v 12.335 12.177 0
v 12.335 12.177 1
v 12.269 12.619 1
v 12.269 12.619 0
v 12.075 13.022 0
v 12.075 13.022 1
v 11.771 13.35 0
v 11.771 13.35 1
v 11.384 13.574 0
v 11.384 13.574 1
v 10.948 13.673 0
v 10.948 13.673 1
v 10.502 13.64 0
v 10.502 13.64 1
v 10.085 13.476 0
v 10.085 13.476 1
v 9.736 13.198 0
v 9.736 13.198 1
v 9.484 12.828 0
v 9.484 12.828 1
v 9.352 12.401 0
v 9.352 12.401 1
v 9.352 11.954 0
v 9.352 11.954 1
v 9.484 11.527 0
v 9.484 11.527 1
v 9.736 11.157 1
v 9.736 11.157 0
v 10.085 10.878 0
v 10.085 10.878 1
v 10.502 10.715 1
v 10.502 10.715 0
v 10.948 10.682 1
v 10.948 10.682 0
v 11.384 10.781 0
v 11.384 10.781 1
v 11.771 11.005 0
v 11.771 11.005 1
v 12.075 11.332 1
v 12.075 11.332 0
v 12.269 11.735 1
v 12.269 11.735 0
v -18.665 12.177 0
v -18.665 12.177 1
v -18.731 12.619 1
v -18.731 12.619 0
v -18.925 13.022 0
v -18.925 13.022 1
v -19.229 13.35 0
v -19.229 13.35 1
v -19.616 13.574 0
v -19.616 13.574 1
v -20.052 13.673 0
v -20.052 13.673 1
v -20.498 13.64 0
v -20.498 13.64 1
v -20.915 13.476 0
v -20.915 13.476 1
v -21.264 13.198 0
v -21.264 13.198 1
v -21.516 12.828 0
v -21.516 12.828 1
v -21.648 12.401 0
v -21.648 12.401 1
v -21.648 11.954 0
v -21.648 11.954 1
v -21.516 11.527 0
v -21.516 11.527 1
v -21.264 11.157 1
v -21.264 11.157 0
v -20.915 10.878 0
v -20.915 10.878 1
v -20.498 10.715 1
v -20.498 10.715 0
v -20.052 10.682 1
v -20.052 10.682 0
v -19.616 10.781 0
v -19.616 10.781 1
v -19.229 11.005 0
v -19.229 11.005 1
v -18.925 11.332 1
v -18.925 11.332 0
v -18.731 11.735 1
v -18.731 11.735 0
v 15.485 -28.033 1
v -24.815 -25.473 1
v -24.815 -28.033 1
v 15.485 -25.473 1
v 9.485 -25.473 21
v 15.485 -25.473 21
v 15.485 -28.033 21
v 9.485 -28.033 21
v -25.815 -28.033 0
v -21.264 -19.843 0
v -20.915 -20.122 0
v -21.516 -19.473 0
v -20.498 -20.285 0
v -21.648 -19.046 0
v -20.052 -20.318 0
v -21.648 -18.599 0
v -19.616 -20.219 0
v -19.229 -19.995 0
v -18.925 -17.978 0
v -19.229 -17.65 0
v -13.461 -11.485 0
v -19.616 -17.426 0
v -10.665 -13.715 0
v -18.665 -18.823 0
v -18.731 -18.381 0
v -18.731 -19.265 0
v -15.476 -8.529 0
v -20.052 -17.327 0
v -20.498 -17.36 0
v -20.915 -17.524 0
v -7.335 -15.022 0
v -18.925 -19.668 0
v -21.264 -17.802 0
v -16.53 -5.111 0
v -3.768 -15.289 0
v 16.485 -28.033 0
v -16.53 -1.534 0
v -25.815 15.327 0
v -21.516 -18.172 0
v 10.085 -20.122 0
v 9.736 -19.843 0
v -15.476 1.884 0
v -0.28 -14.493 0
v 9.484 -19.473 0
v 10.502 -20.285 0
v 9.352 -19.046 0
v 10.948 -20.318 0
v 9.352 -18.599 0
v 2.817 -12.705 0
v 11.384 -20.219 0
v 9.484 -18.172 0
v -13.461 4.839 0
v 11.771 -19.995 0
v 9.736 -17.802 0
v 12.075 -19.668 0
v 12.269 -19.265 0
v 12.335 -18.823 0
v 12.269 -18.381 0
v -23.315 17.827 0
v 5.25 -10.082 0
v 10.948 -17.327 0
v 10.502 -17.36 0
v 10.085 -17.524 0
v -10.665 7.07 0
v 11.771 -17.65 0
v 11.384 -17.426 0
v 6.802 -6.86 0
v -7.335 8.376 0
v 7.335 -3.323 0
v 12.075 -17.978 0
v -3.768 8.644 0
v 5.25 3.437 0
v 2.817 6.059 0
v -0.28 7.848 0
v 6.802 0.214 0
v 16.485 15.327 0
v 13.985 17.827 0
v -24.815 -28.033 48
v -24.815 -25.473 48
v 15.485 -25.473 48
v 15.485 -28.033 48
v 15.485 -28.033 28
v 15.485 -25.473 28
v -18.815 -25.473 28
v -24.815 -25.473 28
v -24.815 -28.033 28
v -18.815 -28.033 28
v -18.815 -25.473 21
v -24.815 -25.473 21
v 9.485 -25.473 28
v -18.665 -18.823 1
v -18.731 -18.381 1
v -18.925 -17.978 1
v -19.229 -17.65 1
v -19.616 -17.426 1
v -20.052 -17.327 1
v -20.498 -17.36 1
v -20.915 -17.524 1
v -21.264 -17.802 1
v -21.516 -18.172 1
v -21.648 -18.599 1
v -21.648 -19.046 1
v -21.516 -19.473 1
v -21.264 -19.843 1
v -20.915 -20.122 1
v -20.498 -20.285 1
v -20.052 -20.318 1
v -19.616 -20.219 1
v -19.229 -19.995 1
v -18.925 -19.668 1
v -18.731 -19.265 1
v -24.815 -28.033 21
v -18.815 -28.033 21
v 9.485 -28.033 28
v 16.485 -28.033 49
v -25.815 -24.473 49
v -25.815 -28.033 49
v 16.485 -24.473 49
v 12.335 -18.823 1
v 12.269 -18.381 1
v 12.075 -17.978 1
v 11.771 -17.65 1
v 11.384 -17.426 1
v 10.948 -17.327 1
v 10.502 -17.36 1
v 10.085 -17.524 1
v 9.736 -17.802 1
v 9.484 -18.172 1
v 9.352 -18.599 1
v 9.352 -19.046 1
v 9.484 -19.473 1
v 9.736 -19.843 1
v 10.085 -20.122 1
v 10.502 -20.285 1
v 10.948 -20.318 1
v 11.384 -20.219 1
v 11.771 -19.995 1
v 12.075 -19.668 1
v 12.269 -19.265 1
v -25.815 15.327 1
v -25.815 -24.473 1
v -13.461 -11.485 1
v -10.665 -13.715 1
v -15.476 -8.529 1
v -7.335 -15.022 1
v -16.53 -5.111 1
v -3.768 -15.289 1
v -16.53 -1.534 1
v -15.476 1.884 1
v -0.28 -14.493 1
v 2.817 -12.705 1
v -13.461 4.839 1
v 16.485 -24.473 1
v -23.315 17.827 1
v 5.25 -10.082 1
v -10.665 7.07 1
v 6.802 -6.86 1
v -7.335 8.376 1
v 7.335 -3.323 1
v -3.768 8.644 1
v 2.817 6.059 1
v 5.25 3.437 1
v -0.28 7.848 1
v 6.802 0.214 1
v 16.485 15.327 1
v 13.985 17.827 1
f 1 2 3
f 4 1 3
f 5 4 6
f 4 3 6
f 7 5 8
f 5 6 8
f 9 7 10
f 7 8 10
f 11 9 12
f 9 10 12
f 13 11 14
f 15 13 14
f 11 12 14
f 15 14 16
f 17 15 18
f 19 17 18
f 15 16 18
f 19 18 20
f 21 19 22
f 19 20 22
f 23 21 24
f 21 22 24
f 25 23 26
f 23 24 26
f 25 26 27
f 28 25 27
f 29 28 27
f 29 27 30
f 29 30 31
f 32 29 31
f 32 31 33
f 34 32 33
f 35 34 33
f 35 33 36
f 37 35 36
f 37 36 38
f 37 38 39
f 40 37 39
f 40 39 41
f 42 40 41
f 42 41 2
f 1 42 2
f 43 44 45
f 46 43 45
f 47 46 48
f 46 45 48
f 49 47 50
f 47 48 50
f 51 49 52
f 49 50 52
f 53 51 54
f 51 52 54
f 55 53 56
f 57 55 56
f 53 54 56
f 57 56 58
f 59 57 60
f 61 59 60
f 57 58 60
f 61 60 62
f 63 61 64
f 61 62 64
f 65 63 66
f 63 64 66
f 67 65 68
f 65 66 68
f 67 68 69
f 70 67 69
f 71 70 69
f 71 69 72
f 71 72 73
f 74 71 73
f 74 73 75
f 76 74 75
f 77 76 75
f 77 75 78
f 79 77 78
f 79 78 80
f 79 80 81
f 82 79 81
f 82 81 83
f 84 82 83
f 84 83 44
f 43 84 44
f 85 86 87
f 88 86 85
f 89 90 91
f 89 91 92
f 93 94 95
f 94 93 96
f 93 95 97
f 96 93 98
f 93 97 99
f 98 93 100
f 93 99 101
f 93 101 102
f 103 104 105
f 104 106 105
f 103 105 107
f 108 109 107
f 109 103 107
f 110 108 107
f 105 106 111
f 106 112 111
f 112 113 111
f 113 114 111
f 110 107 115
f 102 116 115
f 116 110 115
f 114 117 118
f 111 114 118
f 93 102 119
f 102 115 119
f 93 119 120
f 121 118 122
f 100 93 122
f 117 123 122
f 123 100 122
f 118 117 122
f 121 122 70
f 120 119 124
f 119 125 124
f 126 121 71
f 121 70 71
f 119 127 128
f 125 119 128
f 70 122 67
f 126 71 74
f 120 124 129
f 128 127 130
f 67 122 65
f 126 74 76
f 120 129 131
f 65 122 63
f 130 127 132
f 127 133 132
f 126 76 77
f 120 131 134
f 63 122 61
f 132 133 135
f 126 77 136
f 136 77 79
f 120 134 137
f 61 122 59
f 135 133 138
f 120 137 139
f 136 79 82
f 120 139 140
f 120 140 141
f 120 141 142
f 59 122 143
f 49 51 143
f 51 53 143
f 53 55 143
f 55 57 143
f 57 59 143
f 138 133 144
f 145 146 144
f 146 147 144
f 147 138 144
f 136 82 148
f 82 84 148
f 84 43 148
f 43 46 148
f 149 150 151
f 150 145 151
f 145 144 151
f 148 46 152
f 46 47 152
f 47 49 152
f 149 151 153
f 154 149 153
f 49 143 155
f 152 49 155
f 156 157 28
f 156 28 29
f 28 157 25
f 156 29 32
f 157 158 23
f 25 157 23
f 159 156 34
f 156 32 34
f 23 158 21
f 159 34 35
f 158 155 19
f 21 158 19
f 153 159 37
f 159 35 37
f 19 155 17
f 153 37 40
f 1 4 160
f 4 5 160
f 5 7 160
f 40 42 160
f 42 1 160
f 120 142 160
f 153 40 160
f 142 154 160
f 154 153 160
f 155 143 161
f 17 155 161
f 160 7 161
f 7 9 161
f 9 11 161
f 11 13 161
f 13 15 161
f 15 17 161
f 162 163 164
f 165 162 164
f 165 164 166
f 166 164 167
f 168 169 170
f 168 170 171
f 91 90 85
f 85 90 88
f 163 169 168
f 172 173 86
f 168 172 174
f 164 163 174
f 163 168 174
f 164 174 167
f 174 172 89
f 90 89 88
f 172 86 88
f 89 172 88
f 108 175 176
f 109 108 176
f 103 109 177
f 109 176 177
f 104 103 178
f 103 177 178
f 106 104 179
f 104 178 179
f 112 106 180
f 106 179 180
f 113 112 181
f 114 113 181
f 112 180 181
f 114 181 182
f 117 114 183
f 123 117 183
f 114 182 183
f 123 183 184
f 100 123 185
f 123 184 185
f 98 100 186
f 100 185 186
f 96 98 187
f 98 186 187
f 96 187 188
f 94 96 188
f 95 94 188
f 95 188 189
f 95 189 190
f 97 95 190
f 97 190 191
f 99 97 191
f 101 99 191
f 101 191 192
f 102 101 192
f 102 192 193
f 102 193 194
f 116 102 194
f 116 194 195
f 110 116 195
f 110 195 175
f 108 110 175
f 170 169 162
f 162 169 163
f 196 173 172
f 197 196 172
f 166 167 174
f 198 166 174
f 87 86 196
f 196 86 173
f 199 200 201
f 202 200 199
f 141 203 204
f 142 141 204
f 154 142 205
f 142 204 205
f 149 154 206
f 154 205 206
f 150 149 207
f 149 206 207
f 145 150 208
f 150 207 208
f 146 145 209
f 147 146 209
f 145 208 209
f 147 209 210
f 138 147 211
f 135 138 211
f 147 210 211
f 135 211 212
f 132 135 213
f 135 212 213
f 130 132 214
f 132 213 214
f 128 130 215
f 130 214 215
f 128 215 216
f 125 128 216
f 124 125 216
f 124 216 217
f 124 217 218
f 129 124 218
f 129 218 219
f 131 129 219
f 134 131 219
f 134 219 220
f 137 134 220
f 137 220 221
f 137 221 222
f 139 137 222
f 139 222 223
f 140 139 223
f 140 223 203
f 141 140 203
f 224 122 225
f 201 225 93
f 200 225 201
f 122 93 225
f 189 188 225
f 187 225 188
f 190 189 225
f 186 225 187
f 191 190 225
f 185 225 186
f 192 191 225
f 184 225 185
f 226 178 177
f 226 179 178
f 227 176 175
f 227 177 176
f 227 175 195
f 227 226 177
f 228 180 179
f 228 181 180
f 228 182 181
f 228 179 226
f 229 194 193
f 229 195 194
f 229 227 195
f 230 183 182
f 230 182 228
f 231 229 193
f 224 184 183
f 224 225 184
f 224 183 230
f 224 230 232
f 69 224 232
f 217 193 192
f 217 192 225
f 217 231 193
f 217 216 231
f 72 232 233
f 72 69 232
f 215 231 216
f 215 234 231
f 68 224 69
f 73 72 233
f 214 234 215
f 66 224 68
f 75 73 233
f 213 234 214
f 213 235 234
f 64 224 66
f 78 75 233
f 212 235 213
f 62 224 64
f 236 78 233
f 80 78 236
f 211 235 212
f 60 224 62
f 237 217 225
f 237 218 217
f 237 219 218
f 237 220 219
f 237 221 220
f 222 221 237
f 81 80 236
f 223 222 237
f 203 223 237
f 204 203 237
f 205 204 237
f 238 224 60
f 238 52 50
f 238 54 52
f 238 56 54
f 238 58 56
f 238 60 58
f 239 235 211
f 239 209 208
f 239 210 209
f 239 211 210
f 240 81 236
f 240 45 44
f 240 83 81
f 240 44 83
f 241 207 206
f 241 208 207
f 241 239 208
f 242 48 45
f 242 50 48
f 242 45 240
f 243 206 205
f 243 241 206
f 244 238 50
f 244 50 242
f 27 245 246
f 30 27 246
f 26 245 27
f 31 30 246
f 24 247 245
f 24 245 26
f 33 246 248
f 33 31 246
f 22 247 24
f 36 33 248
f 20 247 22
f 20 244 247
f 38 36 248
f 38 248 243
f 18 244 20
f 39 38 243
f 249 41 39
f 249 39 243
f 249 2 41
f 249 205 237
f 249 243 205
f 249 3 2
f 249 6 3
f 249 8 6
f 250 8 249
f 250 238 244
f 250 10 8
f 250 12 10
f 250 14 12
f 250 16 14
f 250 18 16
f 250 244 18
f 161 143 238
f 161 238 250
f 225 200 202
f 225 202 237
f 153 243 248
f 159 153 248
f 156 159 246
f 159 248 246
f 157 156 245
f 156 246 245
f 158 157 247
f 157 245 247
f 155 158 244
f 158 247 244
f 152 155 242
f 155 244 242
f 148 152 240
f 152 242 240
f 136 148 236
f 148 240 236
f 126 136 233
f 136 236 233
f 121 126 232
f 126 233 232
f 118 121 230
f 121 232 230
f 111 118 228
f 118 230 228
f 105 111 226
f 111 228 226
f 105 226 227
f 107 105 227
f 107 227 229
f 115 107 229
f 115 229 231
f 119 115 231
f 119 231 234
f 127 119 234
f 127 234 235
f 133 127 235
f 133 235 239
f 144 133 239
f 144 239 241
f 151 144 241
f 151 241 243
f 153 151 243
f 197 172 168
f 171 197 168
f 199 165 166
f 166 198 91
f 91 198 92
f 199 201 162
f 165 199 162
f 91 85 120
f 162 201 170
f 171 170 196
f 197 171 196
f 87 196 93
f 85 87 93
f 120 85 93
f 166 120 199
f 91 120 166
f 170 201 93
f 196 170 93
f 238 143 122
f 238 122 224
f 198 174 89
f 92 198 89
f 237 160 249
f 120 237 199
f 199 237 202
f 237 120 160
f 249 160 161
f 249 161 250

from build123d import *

# Parameters (mm, degrees)
SKETCH1_W            = 42.3
SKETCH1_H            = 42.3
BOSS_EXTRUDE1_DEPTH  = 1
SKETCH3_R            = 0.5
CUT_EXTRUDE1_DEPTH   = 2
CHAMFER1_SIZE        = 2.5
SKETCH4_R            = 12
CUT_EXTRUDE2_DEPTH   = 2
SKETCH5_R            = 1.5
CUT_EXTRUDE3_DEPTH   = 2
SKETCH6_W            = 42.3
SKETCH6_H            = 1
BOSS_EXTRUDE2_DEPTH  = 3.21
SKETCH7_W            = 42.3
SKETCH7_H            = 5.71
BOSS_EXTRUDE3_DEPTH  = 1
SKETCH8_W            = 42.3
SKETCH8_H            = 1
BOSS_EXTRUDE4_DEPTH  = 0.35
SKETCH9_W            = 42.3
SKETCH9_H            = 1
BOSS_EXTRUDE5_DEPTH  = 48
SKETCH10_W           = 42.3
SKETCH10_H           = 1
BOSS_EXTRUDE6_DEPTH  = 2.56
SKETCH11_W           = 49
SKETCH11_H           = 3.56
BOSS_EXTRUDE7_DEPTH  = 1
SKETCH12_W           = 5
SKETCH12_H           = 1
BOSS_EXTRUDE8_DEPTH  = 5
SKETCH13_W           = 49
SKETCH13_H           = 3.56
BOSS_EXTRUDE9_DEPTH  = 1
SKETCH14_W           = 5
SKETCH14_H           = 5
BOSS_EXTRUDE10_DEPTH = 3.56
SKETCH15_W           = 5
SKETCH15_H           = 2.56
CUT_EXTRUDE4_DEPTH   = 5
SKETCH16_R           = 1
CUT_EXTRUDE5_DEPTH   = 5
SKETCH17_W           = 5
SKETCH17_H           = 5
SKETCH17_R           = 1
BOSS_EXTRUDE11_DEPTH = 2.56
CUT_EXTRUDE6_DEPTH   = 5
SKETCH20_W           = 5
SKETCH20_H           = 3.56
BOSS_EXTRUDE12_DEPTH = 1
SKETCH21_W           = 6
SKETCH21_H           = 3.56
BOSS_EXTRUDE13_DEPTH = 1
SKETCH22_W           = 6
SKETCH22_H           = 3.56
BOSS_EXTRUDE14_DEPTH = 1
SKETCH23_W           = 5
SKETCH23_H           = 5
BOSS_EXTRUDE15_DEPTH = 2.56
SKETCH24_W           = 5
SKETCH24_H           = 3.56
BOSS_EXTRUDE16_DEPTH = 1
SKETCH25_W           = 5
SKETCH25_H           = 3.56
BOSS_EXTRUDE17_DEPTH = 1
SKETCH26_W           = 7
SKETCH26_H           = 3.56
BOSS_EXTRUDE18_DEPTH = 1
CUT_EXTRUDE7_DEPTH   = 21
SKETCH31_W           = 6
SKETCH31_H           = 7
CUT_EXTRUDE8_DEPTH   = 4.56
SKETCH32_W           = 6
SKETCH32_H           = 7
BOSS_EXTRUDE19_DEPTH = 2.56
BOSS_EXTRUDE20_START = -2.56
SKETCH34_W           = 6
SKETCH34_H           = 7
BOSS_EXTRUDE20_DEPTH = 2.56
SKETCH35_W           = 6
SKETCH35_H           = 7
CUT_EXTRUDE9_DEPTH   = 46.86


with BuildPart() as part:
    # Sketch1 → Boss-Extrude1 (new body)
    with BuildSketch(Plane.XY):
        with Locations((-4.664501511, -3.32265861)):
            Rectangle(SKETCH1_W, SKETCH1_H)
    extrude(amount=BOSS_EXTRUDE1_DEPTH)

    # Sketch3 → Cut-Extrude1 (cut, through all)
    with BuildSketch(Plane.XY.offset(1)):
        with Locations((-20.164501511, -18.82265861)):
            Circle(SKETCH3_R)
        with Locations((10.835498489, -18.82265861)):
            Circle(SKETCH3_R)
        with Locations((10.835498489, 12.17734139)):
            Circle(SKETCH3_R)
        with Locations((-20.164501511, 12.17734139)):
            Circle(SKETCH3_R)
    extrude(amount=-CUT_EXTRUDE1_DEPTH, mode=Mode.SUBTRACT)

    # Chamfer1
    chamfer1_edges = [part.edges().sort_by_distance(p)[0] for p in [
        (-25.814501511, 17.82734139, 0.5),
        (16.485498489, 17.82734139, 0.5),
        (16.485498489, -24.47265861, 0.5),
        (-25.814501511, -24.47265861, 0.5),
    ]]
    chamfer(chamfer1_edges, length=CHAMFER1_SIZE)

    # Sketch4 → Cut-Extrude2 (cut, through all)
    with BuildSketch(Plane.XY.offset(1)):
        with Locations((-4.664501511, -3.32265861)):
            Circle(SKETCH4_R)
    extrude(amount=-CUT_EXTRUDE2_DEPTH, mode=Mode.SUBTRACT)

    # Sketch5 → Cut-Extrude3 (cut, through all)
    with BuildSketch(Plane.XY.offset(1)):
        with Locations((-20.164501511, 12.17734139)):
            Circle(SKETCH5_R)
        with Locations((-20.164501511, -18.82265861)):
            Circle(SKETCH5_R)
        with Locations((10.835498489, -18.82265861)):
            Circle(SKETCH5_R)
        with Locations((10.835498489, 12.17734139)):
            Circle(SKETCH5_R)
    extrude(amount=-CUT_EXTRUDE3_DEPTH, mode=Mode.SUBTRACT)

    # Sketch6 → Boss-Extrude2 (add)
    with BuildSketch(Plane.XZ.offset(24.47265861)):
        with Locations((-4.664501511, 0.5)):
            Rectangle(SKETCH6_W, SKETCH6_H)
    extrude(amount=BOSS_EXTRUDE2_DEPTH)

    # Sketch7 → Boss-Extrude3 (add)
    with BuildSketch(Plane.XY.offset(1)):
        with Locations((-4.664501511, -24.82765861)):
            Rectangle(SKETCH7_W, SKETCH7_H)
    extrude(amount=-BOSS_EXTRUDE3_DEPTH)

    # Sketch8 → Boss-Extrude4 (add)
    with BuildSketch(Plane.XZ.offset(27.68265861)):
        with Locations((-4.664501511, 0.5)):
            Rectangle(SKETCH8_W, SKETCH8_H)
    extrude(amount=BOSS_EXTRUDE4_DEPTH)

    # Sketch9 → Boss-Extrude5 (add)
    with BuildSketch(Plane.XY.offset(1)):
        with Locations((-4.664501511, -24.97265861)):
            Rectangle(SKETCH9_W, SKETCH9_H)
    extrude(amount=BOSS_EXTRUDE5_DEPTH)

    # Sketch10 → Boss-Extrude6 (add)
    with BuildSketch(Plane.XZ.offset(25.47265861)):
        with Locations((-4.664501511, 48.5)):
            Rectangle(SKETCH10_W, SKETCH10_H)
    extrude(amount=BOSS_EXTRUDE6_DEPTH)

    # Sketch11 → Boss-Extrude7 (add)
    with BuildSketch(Plane.ZY.offset(25.814501511)):
        with Locations((24.5, -26.25265861)):
            Rectangle(SKETCH11_W, SKETCH11_H)
    extrude(amount=-BOSS_EXTRUDE7_DEPTH)

    # Sketch12 → Boss-Extrude8 (add)
    with BuildSketch(Plane.ZY.offset(25.814501511)):
        with Locations((24.5, -27.53265861)):
            Rectangle(SKETCH12_W, SKETCH12_H)
    extrude(amount=BOSS_EXTRUDE8_DEPTH)

    # Sketch13 → Boss-Extrude9 (add)
    with BuildSketch(Plane(origin=(16.485498489, 0, 0), x_dir=(0, 0, -1), z_dir=(1, 0, 0))):
        with Locations((-24.5, -26.25265861)):
            Rectangle(SKETCH13_W, SKETCH13_H)
    extrude(amount=-BOSS_EXTRUDE9_DEPTH)

    # Sketch14 → Boss-Extrude10 (add)
    with BuildSketch(Plane(origin=(0, -24.47265861, 0), x_dir=(1, 0, 0), z_dir=(0, 1, 0))):
        with Locations((18.985498489, -24.5)):
            Rectangle(SKETCH14_W, SKETCH14_H)
    extrude(amount=-BOSS_EXTRUDE10_DEPTH)

    # Sketch15 → Cut-Extrude4 (cut)
    with BuildSketch(Plane(origin=(21.485498489, 0, 0), x_dir=(0, 0, -1), z_dir=(1, 0, 0))):
        with Locations((-24.5, -25.75265861)):
            Rectangle(SKETCH15_W, SKETCH15_H)
    extrude(amount=-CUT_EXTRUDE4_DEPTH, mode=Mode.SUBTRACT)

    # Sketch16 → Cut-Extrude5 (cut)
    with BuildSketch(Plane(origin=(0, -27.03265861, 0), x_dir=(1, 0, 0), z_dir=(0, 1, 0))):
        with Locations((-28.314501511, -24.5)):
            Circle(SKETCH16_R)
        with Locations((18.985498489, -24.5)):
            Circle(SKETCH16_R)
    extrude(amount=-CUT_EXTRUDE5_DEPTH, mode=Mode.SUBTRACT)

    # Sketch17 → Boss-Extrude11 (add)
    with BuildSketch(Plane(origin=(0, -27.03265861, 0), x_dir=(1, 0, 0), z_dir=(0, 1, 0))):
        with Locations((-28.314501511, -24.5)):
            Rectangle(SKETCH17_W, SKETCH17_H)
        with Locations((-28.314501511, -24.5)):
            Circle(SKETCH17_R, mode=Mode.SUBTRACT)
    extrude(amount=BOSS_EXTRUDE11_DEPTH)

    # Sketch19 → Cut-Extrude6 (cut)
    with BuildSketch(Plane(origin=(0, -24.47265861, 0), x_dir=(1, 0, 0), z_dir=(0, 1, 0))):
        Polygon((-29.469202049, -26.5), (-27.159800972, -26.5), (-26.005100434, -24.5), (-27.159800972, -22.5), (-29.469202049, -22.5), (-30.623902587, -24.5), align=None)
    extrude(amount=-CUT_EXTRUDE6_DEPTH, mode=Mode.SUBTRACT)

    # Sketch20 → Boss-Extrude12 (add)
    with BuildSketch(Plane.ZY.offset(30.814501511)):
        with Locations((24.5, -26.25265861)):
            Rectangle(SKETCH20_W, SKETCH20_H)
    extrude(amount=BOSS_EXTRUDE12_DEPTH)

    # Sketch21 → Boss-Extrude13 (add)
    with BuildSketch(Plane.XY.offset(27)):
        with Locations((-28.814501511, -26.25265861)):
            Rectangle(SKETCH21_W, SKETCH21_H)
    extrude(amount=BOSS_EXTRUDE13_DEPTH)

    # Sketch22 → Boss-Extrude14 (add)
    with BuildSketch(Plane(origin=(0, 0, 22), x_dir=(-1, 0, 0), z_dir=(0, 0, -1))):
        with Locations((28.814501511, -26.25265861)):
            Rectangle(SKETCH22_W, SKETCH22_H)
    extrude(amount=BOSS_EXTRUDE14_DEPTH)

    # Sketch23 → Boss-Extrude15 (add)
    with BuildSketch(Plane(origin=(0, -27.03265861, 0), x_dir=(1, 0, 0), z_dir=(0, 1, 0))):
        with Locations((18.985498489, -24.5)):
            Rectangle(SKETCH23_W, SKETCH23_H)
    extrude(amount=BOSS_EXTRUDE15_DEPTH)

    # Sketch24 → Boss-Extrude16 (add)
    with BuildSketch(Plane.XY.offset(27)):
        with Locations((18.985498489, -26.25265861)):
            Rectangle(SKETCH24_W, SKETCH24_H)
    extrude(amount=BOSS_EXTRUDE16_DEPTH)

    # Sketch25 → Boss-Extrude17 (add)
    with BuildSketch(Plane(origin=(0, 0, 22), x_dir=(-1, 0, 0), z_dir=(0, 0, -1))):
        with Locations((-18.985498489, -26.25265861)):
            Rectangle(SKETCH25_W, SKETCH25_H)
    extrude(amount=BOSS_EXTRUDE17_DEPTH)

    # Sketch26 → Boss-Extrude18 (add)
    with BuildSketch(Plane(origin=(21.485498489, 0, 0), x_dir=(0, 0, -1), z_dir=(1, 0, 0))):
        with Locations((-24.5, -26.25265861)):
            Rectangle(SKETCH26_W, SKETCH26_H)
    extrude(amount=BOSS_EXTRUDE18_DEPTH)

    # Sketch29 → Cut-Extrude7 (cut)
    with BuildSketch(Plane(origin=(0, -24.47265861, 0), x_dir=(1, 0, 0), z_dir=(0, 1, 0))):
        Polygon((20.640199028, -26.5), (21.794899566, -24.5), (20.640199028, -22.5), (18.330797951, -22.5), (17.176097413, -24.5), (18.330797951, -26.5), align=None)
    extrude(amount=-CUT_EXTRUDE7_DEPTH, mode=Mode.SUBTRACT)

    # Sketch31 → Cut-Extrude8 (cut, through all)
    with BuildSketch(Plane(origin=(0, -24.47265861, 0), x_dir=(1, 0, 0), z_dir=(0, 1, 0))):
        with Locations((19.485498489, -24.5)):
            Rectangle(SKETCH31_W, SKETCH31_H)
    extrude(amount=-CUT_EXTRUDE8_DEPTH, mode=Mode.SUBTRACT)

    # Sketch32 → Boss-Extrude19 (add)
    with BuildSketch(Plane.XZ.offset(25.47265861)):
        with Locations((-21.814501511, 24.5)):
            Rectangle(SKETCH32_W, SKETCH32_H)
    extrude(amount=BOSS_EXTRUDE19_DEPTH)

    # Sketch34 → Boss-Extrude20 (add)
    with BuildSketch(Plane(origin=(0, -28.03265861, 0), x_dir=(-1, 0, 0), z_dir=(0, -1, 0)).offset(BOSS_EXTRUDE20_START)):
        with Locations((-12.485498489, -24.5)):
            Rectangle(SKETCH34_W, SKETCH34_H)
    extrude(amount=BOSS_EXTRUDE20_DEPTH)

    # Sketch35 → Cut-Extrude9 (cut, through all)
    with BuildSketch(Plane.XZ.offset(28.03265861)):
        with Locations((-28.814501511, 24.5)):
            Rectangle(SKETCH35_W, SKETCH35_H)
    extrude(amount=-CUT_EXTRUDE9_DEPTH, mode=Mode.SUBTRACT)


solid = part.part
